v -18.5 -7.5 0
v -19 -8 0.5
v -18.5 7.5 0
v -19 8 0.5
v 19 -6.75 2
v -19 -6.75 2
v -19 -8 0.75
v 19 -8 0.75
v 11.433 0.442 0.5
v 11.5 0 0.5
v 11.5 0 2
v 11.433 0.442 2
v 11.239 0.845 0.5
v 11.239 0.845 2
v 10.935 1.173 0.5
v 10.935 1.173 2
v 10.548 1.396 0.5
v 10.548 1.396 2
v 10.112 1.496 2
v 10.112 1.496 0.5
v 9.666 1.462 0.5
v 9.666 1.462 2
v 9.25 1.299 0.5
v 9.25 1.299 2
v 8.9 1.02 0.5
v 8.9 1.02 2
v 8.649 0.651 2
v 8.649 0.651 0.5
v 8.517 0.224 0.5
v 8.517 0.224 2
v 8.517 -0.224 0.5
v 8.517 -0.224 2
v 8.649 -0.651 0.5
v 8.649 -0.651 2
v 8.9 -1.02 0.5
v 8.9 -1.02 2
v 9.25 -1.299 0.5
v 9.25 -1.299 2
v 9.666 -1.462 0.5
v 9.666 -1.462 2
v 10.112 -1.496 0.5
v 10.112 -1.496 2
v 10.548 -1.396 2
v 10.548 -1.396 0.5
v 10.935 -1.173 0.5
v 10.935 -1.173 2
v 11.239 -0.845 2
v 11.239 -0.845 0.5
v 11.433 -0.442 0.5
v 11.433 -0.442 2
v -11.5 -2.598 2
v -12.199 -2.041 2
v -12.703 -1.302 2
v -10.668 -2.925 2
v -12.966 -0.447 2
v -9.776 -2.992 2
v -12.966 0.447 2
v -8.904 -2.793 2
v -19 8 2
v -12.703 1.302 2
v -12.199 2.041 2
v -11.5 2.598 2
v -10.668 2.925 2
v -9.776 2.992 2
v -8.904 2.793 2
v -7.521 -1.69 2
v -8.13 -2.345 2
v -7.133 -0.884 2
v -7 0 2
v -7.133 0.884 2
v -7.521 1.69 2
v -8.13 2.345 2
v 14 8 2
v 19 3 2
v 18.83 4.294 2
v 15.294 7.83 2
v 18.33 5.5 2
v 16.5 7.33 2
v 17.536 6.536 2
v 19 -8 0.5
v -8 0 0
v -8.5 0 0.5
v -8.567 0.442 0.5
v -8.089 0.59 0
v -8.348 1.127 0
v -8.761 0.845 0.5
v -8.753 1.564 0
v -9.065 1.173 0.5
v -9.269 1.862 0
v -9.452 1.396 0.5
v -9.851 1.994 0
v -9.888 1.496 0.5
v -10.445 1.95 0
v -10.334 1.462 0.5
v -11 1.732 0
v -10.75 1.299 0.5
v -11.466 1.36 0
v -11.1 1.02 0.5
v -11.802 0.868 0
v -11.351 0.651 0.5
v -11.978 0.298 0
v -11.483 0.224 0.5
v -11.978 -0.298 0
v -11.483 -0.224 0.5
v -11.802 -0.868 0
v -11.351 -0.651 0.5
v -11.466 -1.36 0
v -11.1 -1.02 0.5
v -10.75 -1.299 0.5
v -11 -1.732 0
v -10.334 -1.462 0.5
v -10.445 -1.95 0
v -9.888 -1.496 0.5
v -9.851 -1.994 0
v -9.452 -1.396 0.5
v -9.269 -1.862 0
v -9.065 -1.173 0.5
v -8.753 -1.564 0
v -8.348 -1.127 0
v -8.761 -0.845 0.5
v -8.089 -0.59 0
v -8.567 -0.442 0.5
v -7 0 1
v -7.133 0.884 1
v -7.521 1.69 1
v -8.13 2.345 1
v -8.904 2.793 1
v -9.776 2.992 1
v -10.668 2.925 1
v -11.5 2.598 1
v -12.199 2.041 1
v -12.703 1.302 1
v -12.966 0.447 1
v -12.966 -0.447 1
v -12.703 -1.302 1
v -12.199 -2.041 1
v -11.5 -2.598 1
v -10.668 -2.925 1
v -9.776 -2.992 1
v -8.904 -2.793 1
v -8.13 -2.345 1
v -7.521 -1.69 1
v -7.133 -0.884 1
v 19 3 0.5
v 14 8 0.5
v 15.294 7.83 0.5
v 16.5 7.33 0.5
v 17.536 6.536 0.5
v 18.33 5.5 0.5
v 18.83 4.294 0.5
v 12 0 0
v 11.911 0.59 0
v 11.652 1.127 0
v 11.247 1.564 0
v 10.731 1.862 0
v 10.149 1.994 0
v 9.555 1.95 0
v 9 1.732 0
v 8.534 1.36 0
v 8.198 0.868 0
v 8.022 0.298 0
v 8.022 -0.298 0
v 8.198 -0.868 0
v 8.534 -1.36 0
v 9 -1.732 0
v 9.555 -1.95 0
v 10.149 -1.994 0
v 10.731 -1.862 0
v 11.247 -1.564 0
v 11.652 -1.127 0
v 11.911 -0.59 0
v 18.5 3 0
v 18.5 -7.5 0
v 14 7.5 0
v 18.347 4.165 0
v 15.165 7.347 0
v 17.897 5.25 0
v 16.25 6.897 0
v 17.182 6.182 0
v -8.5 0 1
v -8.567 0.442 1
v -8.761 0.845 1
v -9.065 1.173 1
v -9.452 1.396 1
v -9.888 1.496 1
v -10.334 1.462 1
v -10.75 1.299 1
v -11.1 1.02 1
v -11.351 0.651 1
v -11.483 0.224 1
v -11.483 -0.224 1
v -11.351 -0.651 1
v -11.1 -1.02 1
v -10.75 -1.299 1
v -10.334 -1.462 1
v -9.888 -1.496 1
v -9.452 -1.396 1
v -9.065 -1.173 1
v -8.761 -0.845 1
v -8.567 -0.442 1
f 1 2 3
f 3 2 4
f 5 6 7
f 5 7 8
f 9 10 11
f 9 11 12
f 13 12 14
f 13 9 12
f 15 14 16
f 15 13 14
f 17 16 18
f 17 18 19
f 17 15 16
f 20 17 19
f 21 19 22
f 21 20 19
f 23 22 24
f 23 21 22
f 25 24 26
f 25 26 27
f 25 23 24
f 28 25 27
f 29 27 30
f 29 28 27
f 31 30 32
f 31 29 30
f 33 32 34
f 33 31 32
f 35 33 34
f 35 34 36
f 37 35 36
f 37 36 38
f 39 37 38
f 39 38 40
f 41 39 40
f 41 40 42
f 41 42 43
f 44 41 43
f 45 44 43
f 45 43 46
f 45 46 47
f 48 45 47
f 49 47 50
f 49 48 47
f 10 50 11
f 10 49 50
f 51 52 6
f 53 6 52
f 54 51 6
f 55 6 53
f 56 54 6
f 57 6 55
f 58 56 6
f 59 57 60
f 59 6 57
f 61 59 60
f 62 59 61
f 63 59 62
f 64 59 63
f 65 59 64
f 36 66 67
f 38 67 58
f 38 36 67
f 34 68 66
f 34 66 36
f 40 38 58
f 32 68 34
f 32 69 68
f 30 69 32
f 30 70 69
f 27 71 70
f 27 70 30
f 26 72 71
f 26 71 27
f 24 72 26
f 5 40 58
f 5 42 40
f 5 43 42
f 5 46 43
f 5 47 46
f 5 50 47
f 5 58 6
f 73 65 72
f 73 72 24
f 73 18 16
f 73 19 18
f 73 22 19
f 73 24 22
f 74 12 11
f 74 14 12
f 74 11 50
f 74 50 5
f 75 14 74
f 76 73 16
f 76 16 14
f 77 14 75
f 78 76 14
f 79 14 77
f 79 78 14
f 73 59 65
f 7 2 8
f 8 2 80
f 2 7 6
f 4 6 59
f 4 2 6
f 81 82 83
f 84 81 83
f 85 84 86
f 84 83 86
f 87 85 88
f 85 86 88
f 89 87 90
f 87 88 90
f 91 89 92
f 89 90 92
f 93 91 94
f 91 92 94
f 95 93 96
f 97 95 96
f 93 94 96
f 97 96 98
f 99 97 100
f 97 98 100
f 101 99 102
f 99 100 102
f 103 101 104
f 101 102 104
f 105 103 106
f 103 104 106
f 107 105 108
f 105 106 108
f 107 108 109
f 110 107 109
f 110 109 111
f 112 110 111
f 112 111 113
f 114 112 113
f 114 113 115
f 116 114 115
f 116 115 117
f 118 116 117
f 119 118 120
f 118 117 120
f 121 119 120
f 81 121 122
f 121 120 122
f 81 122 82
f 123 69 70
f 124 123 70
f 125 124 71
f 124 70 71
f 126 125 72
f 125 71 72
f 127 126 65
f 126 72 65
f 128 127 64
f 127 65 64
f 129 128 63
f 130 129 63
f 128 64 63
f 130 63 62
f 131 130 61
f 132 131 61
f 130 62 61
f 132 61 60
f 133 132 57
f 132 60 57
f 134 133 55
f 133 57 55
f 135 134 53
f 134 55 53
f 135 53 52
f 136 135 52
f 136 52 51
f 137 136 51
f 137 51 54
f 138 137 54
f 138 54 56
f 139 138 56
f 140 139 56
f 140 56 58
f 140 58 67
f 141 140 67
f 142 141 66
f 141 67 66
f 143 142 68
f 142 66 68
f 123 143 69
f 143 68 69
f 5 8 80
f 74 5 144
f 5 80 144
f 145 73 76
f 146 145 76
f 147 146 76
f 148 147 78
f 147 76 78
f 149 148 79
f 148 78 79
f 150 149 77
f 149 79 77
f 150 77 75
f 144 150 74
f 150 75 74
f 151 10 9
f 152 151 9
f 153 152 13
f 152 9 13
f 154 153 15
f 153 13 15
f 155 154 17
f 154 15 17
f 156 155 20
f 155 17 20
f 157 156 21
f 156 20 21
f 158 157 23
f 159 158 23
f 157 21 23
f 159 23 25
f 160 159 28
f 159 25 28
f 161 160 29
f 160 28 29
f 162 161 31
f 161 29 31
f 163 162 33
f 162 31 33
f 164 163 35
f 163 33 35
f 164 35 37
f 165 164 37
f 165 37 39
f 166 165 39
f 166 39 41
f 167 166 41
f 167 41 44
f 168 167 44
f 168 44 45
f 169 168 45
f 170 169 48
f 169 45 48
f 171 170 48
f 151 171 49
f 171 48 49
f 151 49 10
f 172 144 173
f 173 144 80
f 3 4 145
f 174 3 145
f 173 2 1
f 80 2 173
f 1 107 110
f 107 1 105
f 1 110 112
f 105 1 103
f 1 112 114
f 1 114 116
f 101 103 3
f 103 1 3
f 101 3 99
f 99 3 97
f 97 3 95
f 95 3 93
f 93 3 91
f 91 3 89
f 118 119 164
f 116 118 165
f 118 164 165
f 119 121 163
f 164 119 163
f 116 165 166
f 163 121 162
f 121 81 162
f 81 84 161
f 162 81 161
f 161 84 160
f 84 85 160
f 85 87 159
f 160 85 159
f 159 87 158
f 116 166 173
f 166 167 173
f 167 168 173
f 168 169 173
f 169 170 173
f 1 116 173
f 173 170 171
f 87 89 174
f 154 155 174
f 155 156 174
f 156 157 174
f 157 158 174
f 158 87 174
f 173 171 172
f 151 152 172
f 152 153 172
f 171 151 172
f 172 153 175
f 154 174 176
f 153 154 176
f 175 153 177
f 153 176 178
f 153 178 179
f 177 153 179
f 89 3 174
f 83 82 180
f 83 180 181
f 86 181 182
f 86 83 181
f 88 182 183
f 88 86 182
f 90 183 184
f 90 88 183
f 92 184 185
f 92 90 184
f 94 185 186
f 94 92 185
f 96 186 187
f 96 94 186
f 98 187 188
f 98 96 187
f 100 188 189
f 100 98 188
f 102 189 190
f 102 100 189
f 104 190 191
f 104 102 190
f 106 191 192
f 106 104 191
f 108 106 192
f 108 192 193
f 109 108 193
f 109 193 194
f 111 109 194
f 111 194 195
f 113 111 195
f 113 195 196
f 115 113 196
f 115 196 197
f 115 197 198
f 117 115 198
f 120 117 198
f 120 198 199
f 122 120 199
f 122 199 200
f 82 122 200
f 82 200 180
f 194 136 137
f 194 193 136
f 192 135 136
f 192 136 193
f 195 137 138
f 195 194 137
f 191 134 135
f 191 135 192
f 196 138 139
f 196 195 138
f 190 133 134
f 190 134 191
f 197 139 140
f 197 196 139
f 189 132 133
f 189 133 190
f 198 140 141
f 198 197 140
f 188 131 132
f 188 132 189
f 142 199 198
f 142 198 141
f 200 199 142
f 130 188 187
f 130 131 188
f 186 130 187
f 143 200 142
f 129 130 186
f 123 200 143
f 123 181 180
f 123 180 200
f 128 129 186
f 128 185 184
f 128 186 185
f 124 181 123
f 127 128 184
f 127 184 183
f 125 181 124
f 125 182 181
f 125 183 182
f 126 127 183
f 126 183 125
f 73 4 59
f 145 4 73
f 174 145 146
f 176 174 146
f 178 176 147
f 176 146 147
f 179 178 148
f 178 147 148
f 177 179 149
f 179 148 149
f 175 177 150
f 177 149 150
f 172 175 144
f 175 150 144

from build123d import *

# Parameters (mm, degrees)
F0_W     = 38
F0_H     = 16
F0_R     = 1.5
F1_DEPTH = 2
F2_SIZE  = 1.25
F4_R     = 5
F3_R     = 3
F3_R_2   = 1.5
F5_DEPTH = 1
F6_SIZE  = 0.5


with BuildPart() as f1:
    # F0 (on Top) → F1 (new body)
    with BuildSketch(Plane.XY):
        Rectangle(F0_W, F0_H)
        with Locations((-10, 0)):
            Circle(F0_R, mode=Mode.SUBTRACT)
        with Locations((10, 0)):
            Circle(F0_R, mode=Mode.SUBTRACT)
    extrude(amount=F1_DEPTH)

    # F2
    f2_edges = [f1.edges().sort_by_distance(p)[0] for p in [
        (0, -8, 2),
    ]]
    chamfer(f2_edges, length=F2_SIZE)

    # F4
    f4_edges = [f1.edges().sort_by_distance(p)[0] for p in [
        (19, 8, 1),
    ]]
    fillet(f4_edges, radius=F4_R)

    # F3 (on face) → F5 (cut)
    with BuildSketch(Plane.XY.offset(2)):
        with Locations((-10, 0)):
            Circle(F3_R)
        with Locations((-10, 0)):
            Circle(F3_R_2, mode=Mode.SUBTRACT)
    extrude(amount=-F5_DEPTH, mode=Mode.SUBTRACT)

    # F6
    f6_edges = [f1.edges().sort_by_distance(p)[0] for p in [
        (-2.5, 8, 0),
        (17.535534, 6.535534, 0),
        (-19, 0, 0),
        (19, -2.5, 0),
        (0, -8, 0),
        (-11.5, 0, 0),
        (8.5, 0, 0),
    ]]
    chamfer(f6_edges, length=F6_SIZE)


solid = f1.part
